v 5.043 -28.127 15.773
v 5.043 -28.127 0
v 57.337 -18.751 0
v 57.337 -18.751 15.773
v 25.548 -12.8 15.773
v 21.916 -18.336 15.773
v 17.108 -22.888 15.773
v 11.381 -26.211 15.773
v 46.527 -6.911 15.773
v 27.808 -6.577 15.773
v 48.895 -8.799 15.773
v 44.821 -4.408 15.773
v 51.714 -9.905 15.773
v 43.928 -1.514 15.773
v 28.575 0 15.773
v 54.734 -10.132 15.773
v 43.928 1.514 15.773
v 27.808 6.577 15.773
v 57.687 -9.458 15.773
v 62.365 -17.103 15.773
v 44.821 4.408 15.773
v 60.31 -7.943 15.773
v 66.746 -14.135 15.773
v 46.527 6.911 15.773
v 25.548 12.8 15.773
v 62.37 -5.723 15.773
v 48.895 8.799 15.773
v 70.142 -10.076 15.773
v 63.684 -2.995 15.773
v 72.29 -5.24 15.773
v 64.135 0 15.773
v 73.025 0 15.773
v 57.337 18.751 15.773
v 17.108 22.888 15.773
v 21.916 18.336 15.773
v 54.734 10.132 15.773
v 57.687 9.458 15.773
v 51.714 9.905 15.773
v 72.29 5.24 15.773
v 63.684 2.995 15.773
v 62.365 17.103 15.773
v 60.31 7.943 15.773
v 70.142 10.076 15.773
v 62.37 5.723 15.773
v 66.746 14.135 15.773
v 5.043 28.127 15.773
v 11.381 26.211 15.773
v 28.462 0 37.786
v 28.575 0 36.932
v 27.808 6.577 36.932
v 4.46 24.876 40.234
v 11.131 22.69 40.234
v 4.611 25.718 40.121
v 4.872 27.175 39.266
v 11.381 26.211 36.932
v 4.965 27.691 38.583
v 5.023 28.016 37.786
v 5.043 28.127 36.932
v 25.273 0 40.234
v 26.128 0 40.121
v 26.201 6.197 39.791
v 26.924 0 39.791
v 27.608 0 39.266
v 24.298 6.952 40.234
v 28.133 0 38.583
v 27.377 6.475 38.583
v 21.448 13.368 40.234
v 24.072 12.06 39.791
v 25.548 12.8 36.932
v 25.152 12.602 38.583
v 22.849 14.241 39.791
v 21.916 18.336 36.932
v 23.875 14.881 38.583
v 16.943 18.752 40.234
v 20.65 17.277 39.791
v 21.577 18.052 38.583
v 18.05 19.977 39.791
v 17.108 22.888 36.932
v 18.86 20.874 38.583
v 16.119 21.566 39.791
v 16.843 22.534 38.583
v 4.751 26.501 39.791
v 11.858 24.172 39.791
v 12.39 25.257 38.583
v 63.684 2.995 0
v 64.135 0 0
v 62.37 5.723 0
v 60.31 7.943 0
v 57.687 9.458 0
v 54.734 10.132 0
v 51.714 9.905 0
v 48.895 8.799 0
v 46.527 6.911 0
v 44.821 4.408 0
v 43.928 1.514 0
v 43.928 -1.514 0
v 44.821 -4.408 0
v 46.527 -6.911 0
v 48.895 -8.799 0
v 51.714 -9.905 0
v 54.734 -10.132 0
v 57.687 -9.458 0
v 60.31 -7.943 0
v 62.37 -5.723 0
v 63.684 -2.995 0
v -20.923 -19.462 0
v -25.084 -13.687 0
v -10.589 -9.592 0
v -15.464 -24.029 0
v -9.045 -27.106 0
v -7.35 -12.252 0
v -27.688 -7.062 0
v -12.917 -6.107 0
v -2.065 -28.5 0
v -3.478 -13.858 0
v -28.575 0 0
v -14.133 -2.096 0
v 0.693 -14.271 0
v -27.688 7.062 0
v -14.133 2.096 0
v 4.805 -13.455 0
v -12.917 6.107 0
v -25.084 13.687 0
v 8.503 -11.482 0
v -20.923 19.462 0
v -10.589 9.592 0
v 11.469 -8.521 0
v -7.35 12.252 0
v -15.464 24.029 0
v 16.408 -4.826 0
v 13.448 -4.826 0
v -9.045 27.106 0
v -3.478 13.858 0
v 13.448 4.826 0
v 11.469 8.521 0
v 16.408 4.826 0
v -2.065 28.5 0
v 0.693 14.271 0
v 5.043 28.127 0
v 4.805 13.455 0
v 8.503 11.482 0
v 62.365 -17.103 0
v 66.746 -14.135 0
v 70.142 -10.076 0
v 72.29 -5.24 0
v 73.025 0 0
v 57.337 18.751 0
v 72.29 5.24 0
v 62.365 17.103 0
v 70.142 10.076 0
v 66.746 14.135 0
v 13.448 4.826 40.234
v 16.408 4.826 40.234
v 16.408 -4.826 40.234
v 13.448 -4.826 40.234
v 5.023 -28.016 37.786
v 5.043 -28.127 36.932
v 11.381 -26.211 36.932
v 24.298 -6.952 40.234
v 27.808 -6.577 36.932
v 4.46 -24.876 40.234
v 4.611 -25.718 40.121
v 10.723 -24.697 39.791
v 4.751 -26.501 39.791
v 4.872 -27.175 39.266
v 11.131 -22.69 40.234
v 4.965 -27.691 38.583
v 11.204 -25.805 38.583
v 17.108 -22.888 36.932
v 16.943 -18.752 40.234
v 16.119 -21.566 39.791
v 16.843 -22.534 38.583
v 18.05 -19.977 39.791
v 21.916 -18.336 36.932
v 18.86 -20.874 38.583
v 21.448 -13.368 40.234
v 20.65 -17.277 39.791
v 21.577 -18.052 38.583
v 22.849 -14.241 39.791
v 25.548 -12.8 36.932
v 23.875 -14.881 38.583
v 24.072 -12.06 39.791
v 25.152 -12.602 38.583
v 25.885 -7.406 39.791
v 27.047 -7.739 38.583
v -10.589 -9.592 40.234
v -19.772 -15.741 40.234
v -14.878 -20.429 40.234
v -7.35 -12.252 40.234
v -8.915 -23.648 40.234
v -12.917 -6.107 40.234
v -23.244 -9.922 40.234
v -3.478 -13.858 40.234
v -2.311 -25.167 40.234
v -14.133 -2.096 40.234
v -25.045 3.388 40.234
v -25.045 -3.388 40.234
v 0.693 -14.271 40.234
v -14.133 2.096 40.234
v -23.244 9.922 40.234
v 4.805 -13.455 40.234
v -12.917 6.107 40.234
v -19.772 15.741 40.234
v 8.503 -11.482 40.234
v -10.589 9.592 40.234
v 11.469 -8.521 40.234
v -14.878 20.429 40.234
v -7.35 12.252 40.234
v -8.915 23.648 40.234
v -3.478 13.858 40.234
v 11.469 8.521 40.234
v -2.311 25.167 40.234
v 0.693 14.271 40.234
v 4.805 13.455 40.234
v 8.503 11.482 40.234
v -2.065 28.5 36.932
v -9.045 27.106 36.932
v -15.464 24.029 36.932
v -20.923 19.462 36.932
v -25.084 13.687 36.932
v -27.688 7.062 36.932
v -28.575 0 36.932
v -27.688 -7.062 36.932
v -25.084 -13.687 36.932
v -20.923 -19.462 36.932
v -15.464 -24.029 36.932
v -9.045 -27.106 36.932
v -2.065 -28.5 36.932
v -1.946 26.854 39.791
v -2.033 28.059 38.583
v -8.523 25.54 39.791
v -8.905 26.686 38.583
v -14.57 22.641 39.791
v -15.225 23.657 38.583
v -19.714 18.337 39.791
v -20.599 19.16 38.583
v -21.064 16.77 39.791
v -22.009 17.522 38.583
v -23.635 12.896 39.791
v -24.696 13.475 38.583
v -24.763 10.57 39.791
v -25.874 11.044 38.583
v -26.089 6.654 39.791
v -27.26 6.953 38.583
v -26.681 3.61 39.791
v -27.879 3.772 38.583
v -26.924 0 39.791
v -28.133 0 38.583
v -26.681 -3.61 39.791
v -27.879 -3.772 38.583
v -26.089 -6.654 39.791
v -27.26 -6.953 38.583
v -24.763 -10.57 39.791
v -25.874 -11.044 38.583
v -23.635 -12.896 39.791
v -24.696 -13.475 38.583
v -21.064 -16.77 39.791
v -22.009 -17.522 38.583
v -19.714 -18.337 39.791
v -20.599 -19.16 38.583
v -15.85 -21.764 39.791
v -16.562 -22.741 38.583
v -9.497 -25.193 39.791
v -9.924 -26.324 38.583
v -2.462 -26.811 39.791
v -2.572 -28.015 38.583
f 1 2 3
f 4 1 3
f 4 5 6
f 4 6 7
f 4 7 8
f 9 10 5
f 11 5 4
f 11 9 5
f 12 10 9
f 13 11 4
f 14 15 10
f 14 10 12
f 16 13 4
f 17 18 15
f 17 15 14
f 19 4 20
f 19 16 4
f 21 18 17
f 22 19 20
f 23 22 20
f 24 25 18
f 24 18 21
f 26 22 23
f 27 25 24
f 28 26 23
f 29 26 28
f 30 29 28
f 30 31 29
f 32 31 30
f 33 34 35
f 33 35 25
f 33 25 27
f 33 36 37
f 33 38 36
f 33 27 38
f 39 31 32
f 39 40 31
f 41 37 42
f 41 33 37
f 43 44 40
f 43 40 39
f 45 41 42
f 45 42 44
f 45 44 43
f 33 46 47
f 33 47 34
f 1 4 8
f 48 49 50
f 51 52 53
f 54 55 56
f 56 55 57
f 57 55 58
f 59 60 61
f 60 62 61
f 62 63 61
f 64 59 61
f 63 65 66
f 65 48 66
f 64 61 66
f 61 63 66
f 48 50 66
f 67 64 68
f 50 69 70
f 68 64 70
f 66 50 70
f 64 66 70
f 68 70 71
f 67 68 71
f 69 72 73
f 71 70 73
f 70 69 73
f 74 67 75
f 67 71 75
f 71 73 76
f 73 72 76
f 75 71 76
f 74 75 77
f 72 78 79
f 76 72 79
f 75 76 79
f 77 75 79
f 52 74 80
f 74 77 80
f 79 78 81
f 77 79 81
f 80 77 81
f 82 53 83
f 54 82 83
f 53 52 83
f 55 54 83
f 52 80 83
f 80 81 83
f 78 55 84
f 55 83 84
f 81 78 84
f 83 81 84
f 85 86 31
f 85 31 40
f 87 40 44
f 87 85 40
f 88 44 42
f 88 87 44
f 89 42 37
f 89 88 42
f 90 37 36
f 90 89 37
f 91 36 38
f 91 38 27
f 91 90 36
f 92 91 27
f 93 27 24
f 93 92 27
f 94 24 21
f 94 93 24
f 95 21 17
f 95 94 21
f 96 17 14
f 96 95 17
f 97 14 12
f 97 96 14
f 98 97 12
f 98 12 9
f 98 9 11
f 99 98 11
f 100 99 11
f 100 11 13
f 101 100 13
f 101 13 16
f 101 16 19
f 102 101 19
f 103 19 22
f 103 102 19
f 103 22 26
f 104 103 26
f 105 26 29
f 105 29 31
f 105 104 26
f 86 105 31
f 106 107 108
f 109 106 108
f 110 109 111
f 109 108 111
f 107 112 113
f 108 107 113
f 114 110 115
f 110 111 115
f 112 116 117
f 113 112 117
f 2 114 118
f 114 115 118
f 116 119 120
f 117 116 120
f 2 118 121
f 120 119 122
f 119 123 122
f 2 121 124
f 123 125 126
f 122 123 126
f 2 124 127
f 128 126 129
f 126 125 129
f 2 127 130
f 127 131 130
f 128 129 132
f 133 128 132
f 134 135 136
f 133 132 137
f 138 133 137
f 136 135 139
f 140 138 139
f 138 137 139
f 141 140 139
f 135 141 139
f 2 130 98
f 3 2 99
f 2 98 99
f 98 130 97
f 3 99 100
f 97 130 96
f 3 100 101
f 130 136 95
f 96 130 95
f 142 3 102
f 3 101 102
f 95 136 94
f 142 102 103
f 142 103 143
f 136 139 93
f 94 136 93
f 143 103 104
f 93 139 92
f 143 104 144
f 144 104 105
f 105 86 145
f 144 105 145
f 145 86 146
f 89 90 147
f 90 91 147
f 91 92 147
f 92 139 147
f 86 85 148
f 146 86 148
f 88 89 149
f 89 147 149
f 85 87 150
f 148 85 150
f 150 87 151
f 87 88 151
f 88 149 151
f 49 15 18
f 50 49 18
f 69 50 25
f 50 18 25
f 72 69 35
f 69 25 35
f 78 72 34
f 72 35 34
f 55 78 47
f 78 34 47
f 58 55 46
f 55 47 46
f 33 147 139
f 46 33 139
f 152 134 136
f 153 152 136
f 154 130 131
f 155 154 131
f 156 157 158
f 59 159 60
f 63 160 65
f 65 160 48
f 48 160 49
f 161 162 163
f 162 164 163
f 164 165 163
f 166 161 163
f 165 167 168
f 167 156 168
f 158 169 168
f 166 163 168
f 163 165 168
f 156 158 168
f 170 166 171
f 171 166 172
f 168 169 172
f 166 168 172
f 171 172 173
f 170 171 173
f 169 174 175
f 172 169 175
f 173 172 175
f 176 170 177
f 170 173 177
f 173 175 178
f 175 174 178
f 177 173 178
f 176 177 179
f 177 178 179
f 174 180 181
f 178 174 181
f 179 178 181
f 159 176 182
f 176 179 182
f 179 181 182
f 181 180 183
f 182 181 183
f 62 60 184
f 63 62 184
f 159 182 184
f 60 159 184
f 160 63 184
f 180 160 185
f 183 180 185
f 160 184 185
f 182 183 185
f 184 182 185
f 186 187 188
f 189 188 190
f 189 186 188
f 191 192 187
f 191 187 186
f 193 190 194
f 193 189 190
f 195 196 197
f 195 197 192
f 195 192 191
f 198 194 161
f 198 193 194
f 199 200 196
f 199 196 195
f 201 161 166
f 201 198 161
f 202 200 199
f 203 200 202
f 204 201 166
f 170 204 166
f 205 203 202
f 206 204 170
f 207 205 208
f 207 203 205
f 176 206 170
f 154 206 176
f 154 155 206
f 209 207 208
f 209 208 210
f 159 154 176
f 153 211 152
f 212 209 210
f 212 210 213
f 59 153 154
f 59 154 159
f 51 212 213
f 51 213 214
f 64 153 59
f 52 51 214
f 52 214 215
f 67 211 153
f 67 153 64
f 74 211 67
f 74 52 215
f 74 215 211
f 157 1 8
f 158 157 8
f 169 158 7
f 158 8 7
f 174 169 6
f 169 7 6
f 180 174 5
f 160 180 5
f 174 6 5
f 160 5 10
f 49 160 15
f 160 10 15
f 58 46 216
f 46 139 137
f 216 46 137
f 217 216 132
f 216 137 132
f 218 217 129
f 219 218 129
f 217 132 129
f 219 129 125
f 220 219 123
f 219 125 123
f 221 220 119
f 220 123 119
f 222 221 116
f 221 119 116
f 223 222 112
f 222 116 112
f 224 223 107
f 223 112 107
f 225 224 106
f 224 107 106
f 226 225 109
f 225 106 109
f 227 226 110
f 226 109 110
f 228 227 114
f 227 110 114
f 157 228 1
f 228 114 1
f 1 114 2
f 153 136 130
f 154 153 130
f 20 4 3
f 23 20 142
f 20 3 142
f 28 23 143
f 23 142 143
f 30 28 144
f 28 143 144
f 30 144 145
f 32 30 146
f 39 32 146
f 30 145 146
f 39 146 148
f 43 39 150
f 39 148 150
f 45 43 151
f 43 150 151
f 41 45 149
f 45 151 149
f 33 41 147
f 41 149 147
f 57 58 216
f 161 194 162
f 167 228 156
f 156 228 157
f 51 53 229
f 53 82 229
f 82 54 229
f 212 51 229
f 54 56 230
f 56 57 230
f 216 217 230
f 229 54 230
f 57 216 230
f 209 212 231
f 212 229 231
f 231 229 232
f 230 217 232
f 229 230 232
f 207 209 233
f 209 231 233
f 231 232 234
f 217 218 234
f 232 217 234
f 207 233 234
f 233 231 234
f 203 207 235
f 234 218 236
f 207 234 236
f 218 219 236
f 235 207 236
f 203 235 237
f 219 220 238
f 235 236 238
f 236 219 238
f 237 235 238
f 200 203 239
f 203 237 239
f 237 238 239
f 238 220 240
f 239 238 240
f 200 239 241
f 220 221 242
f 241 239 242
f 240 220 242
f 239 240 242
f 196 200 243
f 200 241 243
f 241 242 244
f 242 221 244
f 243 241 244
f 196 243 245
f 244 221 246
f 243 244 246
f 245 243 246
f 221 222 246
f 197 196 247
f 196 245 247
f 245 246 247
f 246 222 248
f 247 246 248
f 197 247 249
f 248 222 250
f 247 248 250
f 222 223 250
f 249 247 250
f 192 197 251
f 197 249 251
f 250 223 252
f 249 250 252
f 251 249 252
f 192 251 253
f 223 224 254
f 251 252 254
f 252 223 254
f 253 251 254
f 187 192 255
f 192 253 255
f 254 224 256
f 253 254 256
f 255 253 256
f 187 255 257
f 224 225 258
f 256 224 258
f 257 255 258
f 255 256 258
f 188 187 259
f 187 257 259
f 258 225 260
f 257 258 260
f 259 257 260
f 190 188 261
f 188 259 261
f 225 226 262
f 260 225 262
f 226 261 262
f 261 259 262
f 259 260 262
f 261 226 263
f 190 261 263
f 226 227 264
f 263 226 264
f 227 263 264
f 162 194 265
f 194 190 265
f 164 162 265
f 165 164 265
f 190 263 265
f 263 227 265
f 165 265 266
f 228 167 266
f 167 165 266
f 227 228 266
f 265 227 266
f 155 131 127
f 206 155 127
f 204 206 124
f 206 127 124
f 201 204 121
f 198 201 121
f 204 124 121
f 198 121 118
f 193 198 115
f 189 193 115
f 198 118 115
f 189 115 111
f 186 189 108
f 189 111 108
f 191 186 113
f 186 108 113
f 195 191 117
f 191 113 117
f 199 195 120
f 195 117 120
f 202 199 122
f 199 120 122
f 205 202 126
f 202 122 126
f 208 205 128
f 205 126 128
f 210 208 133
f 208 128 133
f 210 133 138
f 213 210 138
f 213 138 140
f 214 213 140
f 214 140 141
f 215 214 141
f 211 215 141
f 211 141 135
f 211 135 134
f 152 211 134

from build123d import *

# Parameters (mm, degrees)
F1_DEPTH = 40.2336
F0_R     = 10.16
F2_DEPTH = 15.7734
F3_R     = 3.302


with BuildPart() as f1:
    # F0 (on Top) → F1 (new body)
    with BuildSketch(Plane.XY):
        with BuildLine():
            ThreePointArc((5.042647, -28.126541), (21.916025, -18.336262), (28.575, 0))
            ThreePointArc((28.575, 0), (21.916025, 18.336262), (5.042647, 28.126541))
            ThreePointArc((5.042647, 28.126541), (-28.575, 0), (5.042647, -28.126541))
        make_face()
        with BuildLine():
            ThreePointArc((13.447765, -4.826), (-14.2875, 0), (13.447765, 4.826))
            Line((13.447765, 4.826), (16.4084, 4.826))
            Line((16.4084, 4.826), (16.4084, -4.826))
            Line((16.4084, -4.826), (13.447765, -4.826))
        make_face(mode=Mode.SUBTRACT)
    extrude(amount=F1_DEPTH)

    # F0 (on Top) → F2 (join)
    with BuildSketch(Plane.XY):
        with BuildLine():
            ThreePointArc((5.042647, -28.126541), (21.916025, -18.336262), (28.575, 0))
            ThreePointArc((28.575, 0), (21.916025, 18.336262), (5.042647, 28.126541))
            ThreePointArc((5.042647, 28.126541), (-28.575, 0), (5.042647, -28.126541))
        make_face()
        with BuildLine():
            ThreePointArc((13.447765, -4.826), (-14.2875, 0), (13.447765, 4.826))
            Line((13.447765, 4.826), (16.4084, 4.826))
            Line((16.4084, 4.826), (16.4084, -4.826))
            Line((16.4084, -4.826), (13.447765, -4.826))
        make_face(mode=Mode.SUBTRACT)
        with BuildLine():
            ThreePointArc((5.042647, 28.126541), (21.916025, 18.336262), (28.575, 0))
            ThreePointArc((28.575, 0), (21.916025, -18.336262), (5.042647, -28.126541))
            Line((5.042647, -28.126541), (57.336765, -18.751028))
            ThreePointArc((57.336765, -18.751028), (73.025, 0), (57.336765, 18.751028))
            Line((57.336765, 18.751028), (5.042647, 28.126541))
        make_face()
        with Locations((53.975, 0)):
            Circle(F0_R, mode=Mode.SUBTRACT)
    extrude(amount=F2_DEPTH)

    # F3
    f3_edges = [f1.edges().sort_by_distance(p)[0] for p in [
        (-5.042647, 28.126541, 40.2336),
    ]]
    fillet(f3_edges, radius=F3_R)


solid = f1.part
